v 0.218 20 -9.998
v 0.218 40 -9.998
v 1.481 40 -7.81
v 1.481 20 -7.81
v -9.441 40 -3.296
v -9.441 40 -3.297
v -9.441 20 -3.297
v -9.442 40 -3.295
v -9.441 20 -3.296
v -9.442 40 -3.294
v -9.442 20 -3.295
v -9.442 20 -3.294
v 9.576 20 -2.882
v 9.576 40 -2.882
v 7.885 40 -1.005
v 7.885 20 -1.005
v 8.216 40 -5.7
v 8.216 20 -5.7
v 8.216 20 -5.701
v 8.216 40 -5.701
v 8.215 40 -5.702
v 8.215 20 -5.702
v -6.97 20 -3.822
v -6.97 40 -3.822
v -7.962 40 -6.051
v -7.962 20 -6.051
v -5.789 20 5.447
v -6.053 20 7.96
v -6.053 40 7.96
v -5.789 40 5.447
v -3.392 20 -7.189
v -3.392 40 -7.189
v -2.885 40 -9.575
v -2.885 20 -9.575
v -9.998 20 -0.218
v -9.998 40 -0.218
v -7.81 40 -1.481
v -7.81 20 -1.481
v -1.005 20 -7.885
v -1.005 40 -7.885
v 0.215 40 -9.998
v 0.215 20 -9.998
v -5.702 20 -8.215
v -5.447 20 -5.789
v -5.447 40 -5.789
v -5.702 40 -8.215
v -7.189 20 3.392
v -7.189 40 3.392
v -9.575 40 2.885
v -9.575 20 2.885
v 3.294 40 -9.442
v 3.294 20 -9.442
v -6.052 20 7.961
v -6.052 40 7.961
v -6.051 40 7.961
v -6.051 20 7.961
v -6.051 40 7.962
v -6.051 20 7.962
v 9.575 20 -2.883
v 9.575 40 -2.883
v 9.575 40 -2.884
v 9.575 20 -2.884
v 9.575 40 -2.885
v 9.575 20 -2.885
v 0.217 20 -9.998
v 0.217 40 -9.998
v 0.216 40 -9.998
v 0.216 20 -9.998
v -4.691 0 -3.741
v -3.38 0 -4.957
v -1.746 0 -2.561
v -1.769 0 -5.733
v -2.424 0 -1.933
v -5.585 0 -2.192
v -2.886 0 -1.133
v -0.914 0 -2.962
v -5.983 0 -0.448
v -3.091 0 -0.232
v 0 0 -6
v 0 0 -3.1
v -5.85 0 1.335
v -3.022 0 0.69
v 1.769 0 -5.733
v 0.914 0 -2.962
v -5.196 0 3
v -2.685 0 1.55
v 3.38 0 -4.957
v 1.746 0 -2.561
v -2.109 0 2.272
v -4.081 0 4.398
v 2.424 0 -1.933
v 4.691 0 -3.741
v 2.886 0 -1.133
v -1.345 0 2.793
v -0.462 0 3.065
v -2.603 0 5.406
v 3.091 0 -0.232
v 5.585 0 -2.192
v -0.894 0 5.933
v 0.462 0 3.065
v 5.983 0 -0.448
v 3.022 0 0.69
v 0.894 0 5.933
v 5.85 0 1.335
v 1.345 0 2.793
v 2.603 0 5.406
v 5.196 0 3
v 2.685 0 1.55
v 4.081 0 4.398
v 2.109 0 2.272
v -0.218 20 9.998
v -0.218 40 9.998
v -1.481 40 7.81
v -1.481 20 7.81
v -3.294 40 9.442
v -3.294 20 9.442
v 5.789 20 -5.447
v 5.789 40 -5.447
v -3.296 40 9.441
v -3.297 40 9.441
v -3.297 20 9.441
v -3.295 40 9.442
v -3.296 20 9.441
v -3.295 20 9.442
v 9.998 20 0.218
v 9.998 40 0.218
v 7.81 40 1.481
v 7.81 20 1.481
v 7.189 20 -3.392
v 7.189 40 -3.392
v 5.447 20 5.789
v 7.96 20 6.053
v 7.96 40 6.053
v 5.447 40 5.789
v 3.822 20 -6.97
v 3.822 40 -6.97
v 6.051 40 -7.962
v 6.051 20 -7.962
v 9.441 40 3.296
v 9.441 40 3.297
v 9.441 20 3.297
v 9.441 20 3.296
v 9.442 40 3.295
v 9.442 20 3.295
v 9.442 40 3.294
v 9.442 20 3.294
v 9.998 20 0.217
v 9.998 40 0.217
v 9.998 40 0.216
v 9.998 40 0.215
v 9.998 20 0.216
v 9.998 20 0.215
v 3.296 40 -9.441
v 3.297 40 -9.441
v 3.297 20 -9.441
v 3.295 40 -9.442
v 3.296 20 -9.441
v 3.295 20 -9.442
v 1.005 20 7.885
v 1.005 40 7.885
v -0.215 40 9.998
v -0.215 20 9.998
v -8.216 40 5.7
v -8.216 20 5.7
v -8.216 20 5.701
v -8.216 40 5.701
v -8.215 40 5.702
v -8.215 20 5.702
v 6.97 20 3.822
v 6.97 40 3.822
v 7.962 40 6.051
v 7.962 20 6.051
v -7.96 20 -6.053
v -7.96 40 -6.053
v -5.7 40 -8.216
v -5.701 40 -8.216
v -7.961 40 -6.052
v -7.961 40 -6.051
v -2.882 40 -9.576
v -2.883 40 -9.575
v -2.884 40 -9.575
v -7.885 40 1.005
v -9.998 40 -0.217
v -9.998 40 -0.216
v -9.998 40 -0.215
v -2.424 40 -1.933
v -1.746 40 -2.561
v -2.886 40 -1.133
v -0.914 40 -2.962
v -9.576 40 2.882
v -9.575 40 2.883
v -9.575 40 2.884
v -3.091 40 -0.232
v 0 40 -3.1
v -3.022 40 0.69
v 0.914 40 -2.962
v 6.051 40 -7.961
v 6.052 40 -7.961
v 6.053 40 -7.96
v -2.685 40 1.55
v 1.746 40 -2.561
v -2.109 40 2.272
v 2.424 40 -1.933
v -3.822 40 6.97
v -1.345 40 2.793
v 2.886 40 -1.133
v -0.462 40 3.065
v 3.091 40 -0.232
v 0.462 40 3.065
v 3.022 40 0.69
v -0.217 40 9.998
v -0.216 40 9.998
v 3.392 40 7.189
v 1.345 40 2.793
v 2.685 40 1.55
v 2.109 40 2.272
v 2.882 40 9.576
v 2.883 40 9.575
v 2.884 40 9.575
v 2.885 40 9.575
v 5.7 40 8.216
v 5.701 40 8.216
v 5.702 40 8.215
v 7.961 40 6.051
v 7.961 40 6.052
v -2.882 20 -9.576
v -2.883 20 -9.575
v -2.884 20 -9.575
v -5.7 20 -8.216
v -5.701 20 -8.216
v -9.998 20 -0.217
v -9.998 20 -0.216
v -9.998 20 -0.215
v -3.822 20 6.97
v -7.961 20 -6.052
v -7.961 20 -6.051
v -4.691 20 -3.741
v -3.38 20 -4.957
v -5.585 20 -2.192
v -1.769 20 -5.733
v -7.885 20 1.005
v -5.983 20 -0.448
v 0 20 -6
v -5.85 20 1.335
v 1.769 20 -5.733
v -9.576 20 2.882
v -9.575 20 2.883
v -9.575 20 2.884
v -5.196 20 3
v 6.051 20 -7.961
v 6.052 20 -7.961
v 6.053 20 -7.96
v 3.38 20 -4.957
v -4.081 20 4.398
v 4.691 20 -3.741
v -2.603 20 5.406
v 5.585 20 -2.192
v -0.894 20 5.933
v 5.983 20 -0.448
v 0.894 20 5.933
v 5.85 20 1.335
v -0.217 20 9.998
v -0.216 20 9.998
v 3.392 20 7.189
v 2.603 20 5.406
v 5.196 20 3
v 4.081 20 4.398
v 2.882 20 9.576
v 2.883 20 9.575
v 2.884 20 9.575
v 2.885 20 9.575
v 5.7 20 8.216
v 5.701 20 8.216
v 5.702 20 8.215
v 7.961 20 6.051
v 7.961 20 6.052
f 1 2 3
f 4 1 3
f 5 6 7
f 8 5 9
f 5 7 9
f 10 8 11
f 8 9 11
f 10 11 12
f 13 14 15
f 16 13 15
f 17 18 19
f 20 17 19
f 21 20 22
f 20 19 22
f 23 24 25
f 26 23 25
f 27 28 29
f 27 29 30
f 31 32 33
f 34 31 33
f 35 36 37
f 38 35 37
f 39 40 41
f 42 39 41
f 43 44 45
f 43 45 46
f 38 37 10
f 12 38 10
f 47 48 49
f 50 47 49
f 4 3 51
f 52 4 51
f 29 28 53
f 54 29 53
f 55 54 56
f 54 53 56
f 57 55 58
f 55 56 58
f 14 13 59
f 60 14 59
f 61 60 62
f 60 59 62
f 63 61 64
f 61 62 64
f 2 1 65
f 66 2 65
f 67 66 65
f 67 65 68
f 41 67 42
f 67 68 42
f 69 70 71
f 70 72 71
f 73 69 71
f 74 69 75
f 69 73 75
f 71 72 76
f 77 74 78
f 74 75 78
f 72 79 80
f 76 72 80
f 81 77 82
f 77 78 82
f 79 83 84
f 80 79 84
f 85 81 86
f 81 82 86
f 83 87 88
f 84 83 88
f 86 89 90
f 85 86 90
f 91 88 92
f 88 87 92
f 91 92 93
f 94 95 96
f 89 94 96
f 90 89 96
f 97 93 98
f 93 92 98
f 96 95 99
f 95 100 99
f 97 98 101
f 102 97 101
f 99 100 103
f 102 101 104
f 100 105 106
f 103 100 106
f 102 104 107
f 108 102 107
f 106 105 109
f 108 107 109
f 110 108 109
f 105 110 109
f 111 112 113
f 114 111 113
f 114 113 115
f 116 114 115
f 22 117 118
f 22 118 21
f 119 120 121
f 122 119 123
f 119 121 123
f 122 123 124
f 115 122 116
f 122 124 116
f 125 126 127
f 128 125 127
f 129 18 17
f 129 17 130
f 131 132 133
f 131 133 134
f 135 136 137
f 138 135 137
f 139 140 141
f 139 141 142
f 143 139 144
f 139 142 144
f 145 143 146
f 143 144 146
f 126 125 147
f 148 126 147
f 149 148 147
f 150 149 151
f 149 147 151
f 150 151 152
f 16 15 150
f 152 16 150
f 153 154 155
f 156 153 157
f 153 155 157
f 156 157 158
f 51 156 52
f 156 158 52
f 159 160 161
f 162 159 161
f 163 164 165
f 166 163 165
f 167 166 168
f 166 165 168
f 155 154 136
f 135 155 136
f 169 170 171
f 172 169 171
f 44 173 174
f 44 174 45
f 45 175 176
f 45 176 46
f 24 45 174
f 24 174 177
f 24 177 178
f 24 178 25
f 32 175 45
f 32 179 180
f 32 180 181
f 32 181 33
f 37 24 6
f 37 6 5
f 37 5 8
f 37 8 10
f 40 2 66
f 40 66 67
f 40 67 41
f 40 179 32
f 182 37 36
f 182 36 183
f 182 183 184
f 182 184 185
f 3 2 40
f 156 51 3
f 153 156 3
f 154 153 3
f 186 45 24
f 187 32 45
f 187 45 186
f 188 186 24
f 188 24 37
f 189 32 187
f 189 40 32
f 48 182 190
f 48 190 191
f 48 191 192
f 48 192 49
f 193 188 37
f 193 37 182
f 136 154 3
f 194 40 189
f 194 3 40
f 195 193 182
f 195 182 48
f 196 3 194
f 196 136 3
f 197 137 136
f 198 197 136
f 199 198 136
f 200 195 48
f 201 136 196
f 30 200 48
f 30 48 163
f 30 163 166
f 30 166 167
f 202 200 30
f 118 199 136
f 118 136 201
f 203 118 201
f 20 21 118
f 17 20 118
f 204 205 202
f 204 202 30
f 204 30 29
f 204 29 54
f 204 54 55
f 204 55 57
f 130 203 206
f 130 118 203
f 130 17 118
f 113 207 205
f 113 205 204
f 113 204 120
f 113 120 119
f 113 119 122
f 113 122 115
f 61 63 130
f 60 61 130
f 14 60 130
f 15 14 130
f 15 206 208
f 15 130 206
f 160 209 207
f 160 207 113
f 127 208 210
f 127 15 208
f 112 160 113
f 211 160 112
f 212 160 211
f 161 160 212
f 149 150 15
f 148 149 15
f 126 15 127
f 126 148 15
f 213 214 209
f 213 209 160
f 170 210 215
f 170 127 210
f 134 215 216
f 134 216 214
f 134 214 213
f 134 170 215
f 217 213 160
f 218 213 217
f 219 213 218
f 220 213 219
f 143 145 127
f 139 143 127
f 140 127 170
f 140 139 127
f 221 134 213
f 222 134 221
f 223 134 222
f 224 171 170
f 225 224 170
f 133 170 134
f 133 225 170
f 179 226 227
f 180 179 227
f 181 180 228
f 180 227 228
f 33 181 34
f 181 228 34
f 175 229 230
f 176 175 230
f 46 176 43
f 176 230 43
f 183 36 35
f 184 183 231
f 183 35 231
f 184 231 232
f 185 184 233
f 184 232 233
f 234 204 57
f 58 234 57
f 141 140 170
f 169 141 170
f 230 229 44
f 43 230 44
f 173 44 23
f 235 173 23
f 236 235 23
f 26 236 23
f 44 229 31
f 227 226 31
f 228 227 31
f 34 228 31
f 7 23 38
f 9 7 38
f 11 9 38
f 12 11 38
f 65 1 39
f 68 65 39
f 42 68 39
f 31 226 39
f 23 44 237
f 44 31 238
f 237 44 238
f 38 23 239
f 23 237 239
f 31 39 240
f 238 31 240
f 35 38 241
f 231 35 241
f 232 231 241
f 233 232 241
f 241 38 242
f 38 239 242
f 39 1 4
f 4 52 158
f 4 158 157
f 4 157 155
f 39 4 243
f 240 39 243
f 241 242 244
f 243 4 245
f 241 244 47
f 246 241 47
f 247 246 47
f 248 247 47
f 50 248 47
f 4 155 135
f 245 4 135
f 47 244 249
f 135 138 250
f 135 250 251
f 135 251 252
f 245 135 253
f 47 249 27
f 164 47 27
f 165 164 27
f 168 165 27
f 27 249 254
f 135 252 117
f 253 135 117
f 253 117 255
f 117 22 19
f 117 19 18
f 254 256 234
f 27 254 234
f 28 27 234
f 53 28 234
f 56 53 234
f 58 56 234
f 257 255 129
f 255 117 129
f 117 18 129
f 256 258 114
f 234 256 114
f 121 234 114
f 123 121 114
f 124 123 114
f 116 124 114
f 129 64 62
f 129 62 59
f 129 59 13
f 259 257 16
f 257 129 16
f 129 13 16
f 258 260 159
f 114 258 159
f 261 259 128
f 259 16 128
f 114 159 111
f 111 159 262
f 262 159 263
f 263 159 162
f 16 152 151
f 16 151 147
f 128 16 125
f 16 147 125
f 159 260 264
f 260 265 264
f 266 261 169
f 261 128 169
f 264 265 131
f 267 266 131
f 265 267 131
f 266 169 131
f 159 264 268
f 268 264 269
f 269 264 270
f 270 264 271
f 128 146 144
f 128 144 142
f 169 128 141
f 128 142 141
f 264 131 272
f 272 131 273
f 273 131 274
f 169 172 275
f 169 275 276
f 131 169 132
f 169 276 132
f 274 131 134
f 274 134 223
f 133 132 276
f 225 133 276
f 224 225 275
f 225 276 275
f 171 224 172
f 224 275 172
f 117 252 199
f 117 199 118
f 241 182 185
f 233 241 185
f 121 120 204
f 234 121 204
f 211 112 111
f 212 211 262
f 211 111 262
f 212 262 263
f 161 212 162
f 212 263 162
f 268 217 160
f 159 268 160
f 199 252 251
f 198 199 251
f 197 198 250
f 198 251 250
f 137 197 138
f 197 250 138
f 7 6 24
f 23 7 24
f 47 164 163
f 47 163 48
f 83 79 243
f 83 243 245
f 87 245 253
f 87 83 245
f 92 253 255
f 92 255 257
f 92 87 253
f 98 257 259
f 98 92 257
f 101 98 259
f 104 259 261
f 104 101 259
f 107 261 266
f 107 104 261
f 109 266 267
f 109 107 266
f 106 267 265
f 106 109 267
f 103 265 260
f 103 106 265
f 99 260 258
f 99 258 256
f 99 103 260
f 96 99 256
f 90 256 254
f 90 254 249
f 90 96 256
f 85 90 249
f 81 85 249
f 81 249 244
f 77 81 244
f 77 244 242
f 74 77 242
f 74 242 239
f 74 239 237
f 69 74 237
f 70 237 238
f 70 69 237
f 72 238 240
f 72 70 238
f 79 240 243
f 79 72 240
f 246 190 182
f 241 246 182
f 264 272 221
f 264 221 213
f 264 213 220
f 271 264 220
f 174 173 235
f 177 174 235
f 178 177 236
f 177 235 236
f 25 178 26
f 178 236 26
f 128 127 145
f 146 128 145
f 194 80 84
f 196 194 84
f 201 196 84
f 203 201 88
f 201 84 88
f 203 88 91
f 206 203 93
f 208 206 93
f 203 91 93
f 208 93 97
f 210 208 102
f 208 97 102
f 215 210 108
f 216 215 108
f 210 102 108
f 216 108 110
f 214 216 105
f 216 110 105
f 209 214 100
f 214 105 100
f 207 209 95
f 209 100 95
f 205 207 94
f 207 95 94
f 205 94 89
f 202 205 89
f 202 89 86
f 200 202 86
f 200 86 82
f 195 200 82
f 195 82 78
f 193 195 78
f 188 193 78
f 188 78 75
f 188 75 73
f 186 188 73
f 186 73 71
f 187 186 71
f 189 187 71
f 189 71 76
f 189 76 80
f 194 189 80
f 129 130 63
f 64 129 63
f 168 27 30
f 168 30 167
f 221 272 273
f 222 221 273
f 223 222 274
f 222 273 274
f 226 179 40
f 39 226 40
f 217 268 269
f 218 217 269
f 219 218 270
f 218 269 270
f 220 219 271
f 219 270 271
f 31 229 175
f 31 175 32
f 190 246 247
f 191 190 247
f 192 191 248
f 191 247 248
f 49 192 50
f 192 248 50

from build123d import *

# Parameters (mm, degrees)
SKETCH1_R           = 7
SKETCH1_R_2         = 3
BOSS_EXTRUDE1_DEPTH = 20
SKETCH2_R           = 10
SKETCH2_R_2         = 3
BOSS_EXTRUDE2_DEPTH = 20
CUT_EXTRUDE2_DEPTH  = 20
SKETCH4_R           = 21.655225415
SKETCH4_R_2         = 6
CUT_EXTRUDE3_DEPTH  = 20
SKETCH6_R           = 3.1
CUT_EXTRUDE4_DEPTH  = 80


with BuildPart() as part:
    # Sketch1 → Boss-Extrude1 (new body)
    with BuildSketch(Plane(origin=(0, 0, 0), x_dir=(1, 0, 0), z_dir=(0, 1, 0))):
        with Locations(Location((0, 0, 0), (0, 0, 270))):  # turned: the seam where the file's is
            Circle(SKETCH1_R)
        with Locations(Location((0, 0, 0), (0, 0, 270))):  # turned: the seam where the file's is
            Circle(SKETCH1_R_2, mode=Mode.SUBTRACT)
    extrude(amount=BOSS_EXTRUDE1_DEPTH)

    # Sketch2 → Boss-Extrude2 (add)
    with BuildSketch(Plane(origin=(0, 20, 0), x_dir=(1, 0, 0), z_dir=(0, 1, 0))):
        with Locations(Location((0, 0, 0), (0, 0, 270))):  # turned: the seam where the file's is
            Circle(SKETCH2_R)
        with Locations(Location((0, 0, 0), (0, 0, 270))):  # turned: the seam where the file's is
            Circle(SKETCH2_R_2, mode=Mode.SUBTRACT)
    extrude(amount=BOSS_EXTRUDE2_DEPTH)

    # Sketch3 → Cut-Extrude2 (cut)
    with BuildSketch(Plane(origin=(0, 40, 0), x_dir=(1, 0, 0), z_dir=(0, 1, 0))):
        with BuildLine():
            Line((1.481181144, 7.809519004), (3.294093052, 9.441872217))
            ThreePointArc((3.294093052, 9.441872217), (1.777835424, 9.840696175), (0.217876864, 9.997626202))
            Line((0.217876864, 9.997626202), (1.481181144, 7.809519004))
        make_face()
        with BuildLine():
            ThreePointArc((6.050567636, 7.961823364), (4.731764319, 8.809676863), (3.296649611, 9.440979893))
            Line((3.296649611, 9.440979893), (3.821961069, 6.969583792))
            Line((3.821961069, 6.969583792), (6.050567636, 7.961823364))
        make_face()
        with BuildLine():
            Line((-1.004587111, 7.885004083), (0.215169688, 9.997684832))
            ThreePointArc((0.215169688, 9.997684832), (-1.35012039, 9.908439581), (-2.882223189, 9.5756352))
            Line((-2.882223189, 9.5756352), (-1.004587111, 7.885004083))
        make_face()
        with BuildLine():
            ThreePointArc((8.214770503, 5.702415767), (7.222515155, 6.916304999), (6.052723325, 7.960184693))
            Line((6.052723325, 7.960184693), (5.788620815, 5.447417159))
            Line((5.788620815, 5.447417159), (8.214770503, 5.702415767))
        make_face()
        with BuildLine():
            Line((-3.392019381, 7.188650024), (-2.884815983, 9.574854398))
            ThreePointArc((-2.884815983, 9.574854398), (-4.345917013, 9.006275885), (-5.700191154, 8.216314308))
            Line((-5.700191154, 8.216314308), (-3.392019381, 7.188650024))
        make_face()
        with BuildLine():
            ThreePointArc((9.574854398, 2.884815983), (9.006275885, 4.345917013), (8.216314308, 5.700191154))
            Line((8.216314308, 5.700191154), (7.188650024, 3.392019381))
            Line((7.188650024, 3.392019381), (9.574854398, 2.884815983))
        make_face()
        with BuildLine():
            Line((-5.447417159, 5.788620815), (-5.702415767, 8.214770503))
            ThreePointArc((-5.702415767, 8.214770503), (-6.916304999, 7.222515155), (-7.960184693, 6.052723325))
            Line((-7.960184693, 6.052723325), (-5.447417159, 5.788620815))
        make_face()
        with BuildLine():
            ThreePointArc((9.997684832, -0.215169688), (9.908439581, 1.35012039), (9.5756352, 2.882223189))
            Line((9.5756352, 2.882223189), (7.885004083, 1.004587111))
            Line((7.885004083, 1.004587111), (9.997684832, -0.215169688))
        make_face()
        with BuildLine():
            Line((-6.969583792, 3.821961069), (-7.961823364, 6.050567636))
            ThreePointArc((-7.961823364, 6.050567636), (-8.809676863, 4.731764319), (-9.440979893, 3.296649611))
            Line((-9.440979893, 3.296649611), (-6.969583792, 3.821961069))
        make_face()
        with BuildLine():
            ThreePointArc((9.441872217, -3.294093052), (9.840696175, -1.777835424), (9.997626202, -0.217876864))
            Line((9.997626202, -0.217876864), (7.809519004, -1.481181144))
            Line((7.809519004, -1.481181144), (9.441872217, -3.294093052))
        make_face()
        with BuildLine():
            Line((-7.809519004, 1.481181144), (-9.441872217, 3.294093052))
            ThreePointArc((-9.441872217, 3.294093052), (-9.840696175, 1.777835424), (-9.997626202, 0.217876864))
            Line((-9.997626202, 0.217876864), (-7.809519004, 1.481181144))
        make_face()
        with BuildLine():
            ThreePointArc((7.961823364, -6.050567636), (8.809676863, -4.731764319), (9.440979893, -3.296649611))
            Line((9.440979893, -3.296649611), (6.969583792, -3.821961069))
            Line((6.969583792, -3.821961069), (7.961823364, -6.050567636))
        make_face()
        with BuildLine():
            Line((-7.885004083, -1.004587111), (-9.997684832, 0.215169688))
            ThreePointArc((-9.997684832, 0.215169688), (-9.908439581, -1.35012039), (-9.5756352, -2.882223189))
            Line((-9.5756352, -2.882223189), (-7.885004083, -1.004587111))
        make_face()
        with BuildLine():
            ThreePointArc((5.702415767, -8.214770503), (6.916304999, -7.222515155), (7.960184693, -6.052723325))
            Line((7.960184693, -6.052723325), (5.447417159, -5.788620815))
            Line((5.447417159, -5.788620815), (5.702415767, -8.214770503))
        make_face()
        with BuildLine():
            Line((-7.188650024, -3.392019381), (-9.574854398, -2.884815983))
            ThreePointArc((-9.574854398, -2.884815983), (-9.006275885, -4.345917013), (-8.216314308, -5.700191154))
            Line((-8.216314308, -5.700191154), (-7.188650024, -3.392019381))
        make_face()
        with BuildLine():
            ThreePointArc((2.884815983, -9.574854398), (4.345917013, -9.006275885), (5.700191154, -8.216314308))
            Line((5.700191154, -8.216314308), (3.392019381, -7.188650024))
            Line((3.392019381, -7.188650024), (2.884815983, -9.574854398))
        make_face()
        with BuildLine():
            Line((-5.788620815, -5.447417159), (-8.214770503, -5.702415767))
            ThreePointArc((-8.214770503, -5.702415767), (-7.222515155, -6.916304999), (-6.052723325, -7.960184693))
            Line((-6.052723325, -7.960184693), (-5.788620815, -5.447417159))
        make_face()
        with BuildLine():
            ThreePointArc((-0.215169688, -9.997684832), (1.35012039, -9.908439581), (2.882223189, -9.5756352))
            Line((2.882223189, -9.5756352), (1.004587111, -7.885004083))
            Line((1.004587111, -7.885004083), (-0.215169688, -9.997684832))
        make_face()
        with BuildLine():
            Line((-3.821961069, -6.969583792), (-6.050567636, -7.961823364))
            ThreePointArc((-6.050567636, -7.961823364), (-4.731764319, -8.809676863), (-3.296649611, -9.440979893))
            Line((-3.296649611, -9.440979893), (-3.821961069, -6.969583792))
        make_face()
        with BuildLine():
            ThreePointArc((-3.294093052, -9.441872217), (-1.777835424, -9.840696175), (-0.217876864, -9.997626202))
            Line((-0.217876864, -9.997626202), (-1.481181144, -7.809519004))
            Line((-1.481181144, -7.809519004), (-3.294093052, -9.441872217))
        make_face()
    extrude(amount=-CUT_EXTRUDE2_DEPTH, mode=Mode.SUBTRACT)

    # Sketch4 → Cut-Extrude3 (cut)
    with BuildSketch(Plane(origin=(0, 0, 0), x_dir=(-1, 0, 0), z_dir=(0, -1, 0))):
        with Locations((3.244661678, 1.192157737)):
            Circle(SKETCH4_R)
        with Locations(Location((0, 0, 0), (0, 0, 90))):  # turned: the seam where the file's is
            Circle(SKETCH4_R_2, mode=Mode.SUBTRACT)
    extrude(amount=-CUT_EXTRUDE3_DEPTH, mode=Mode.SUBTRACT)

    # Sketch6 → Cut-Extrude4 (cut)
    with BuildSketch(Plane(origin=(0, 0, 0), x_dir=(-1, 0, 0), z_dir=(0, -1, 0))):
        with Locations(Location((0, 0, 0), (0, 0, 90))):  # turned: the seam where the file's is
            Circle(SKETCH6_R)
    extrude(amount=-CUT_EXTRUDE4_DEPTH, mode=Mode.SUBTRACT)


solid = part.part
